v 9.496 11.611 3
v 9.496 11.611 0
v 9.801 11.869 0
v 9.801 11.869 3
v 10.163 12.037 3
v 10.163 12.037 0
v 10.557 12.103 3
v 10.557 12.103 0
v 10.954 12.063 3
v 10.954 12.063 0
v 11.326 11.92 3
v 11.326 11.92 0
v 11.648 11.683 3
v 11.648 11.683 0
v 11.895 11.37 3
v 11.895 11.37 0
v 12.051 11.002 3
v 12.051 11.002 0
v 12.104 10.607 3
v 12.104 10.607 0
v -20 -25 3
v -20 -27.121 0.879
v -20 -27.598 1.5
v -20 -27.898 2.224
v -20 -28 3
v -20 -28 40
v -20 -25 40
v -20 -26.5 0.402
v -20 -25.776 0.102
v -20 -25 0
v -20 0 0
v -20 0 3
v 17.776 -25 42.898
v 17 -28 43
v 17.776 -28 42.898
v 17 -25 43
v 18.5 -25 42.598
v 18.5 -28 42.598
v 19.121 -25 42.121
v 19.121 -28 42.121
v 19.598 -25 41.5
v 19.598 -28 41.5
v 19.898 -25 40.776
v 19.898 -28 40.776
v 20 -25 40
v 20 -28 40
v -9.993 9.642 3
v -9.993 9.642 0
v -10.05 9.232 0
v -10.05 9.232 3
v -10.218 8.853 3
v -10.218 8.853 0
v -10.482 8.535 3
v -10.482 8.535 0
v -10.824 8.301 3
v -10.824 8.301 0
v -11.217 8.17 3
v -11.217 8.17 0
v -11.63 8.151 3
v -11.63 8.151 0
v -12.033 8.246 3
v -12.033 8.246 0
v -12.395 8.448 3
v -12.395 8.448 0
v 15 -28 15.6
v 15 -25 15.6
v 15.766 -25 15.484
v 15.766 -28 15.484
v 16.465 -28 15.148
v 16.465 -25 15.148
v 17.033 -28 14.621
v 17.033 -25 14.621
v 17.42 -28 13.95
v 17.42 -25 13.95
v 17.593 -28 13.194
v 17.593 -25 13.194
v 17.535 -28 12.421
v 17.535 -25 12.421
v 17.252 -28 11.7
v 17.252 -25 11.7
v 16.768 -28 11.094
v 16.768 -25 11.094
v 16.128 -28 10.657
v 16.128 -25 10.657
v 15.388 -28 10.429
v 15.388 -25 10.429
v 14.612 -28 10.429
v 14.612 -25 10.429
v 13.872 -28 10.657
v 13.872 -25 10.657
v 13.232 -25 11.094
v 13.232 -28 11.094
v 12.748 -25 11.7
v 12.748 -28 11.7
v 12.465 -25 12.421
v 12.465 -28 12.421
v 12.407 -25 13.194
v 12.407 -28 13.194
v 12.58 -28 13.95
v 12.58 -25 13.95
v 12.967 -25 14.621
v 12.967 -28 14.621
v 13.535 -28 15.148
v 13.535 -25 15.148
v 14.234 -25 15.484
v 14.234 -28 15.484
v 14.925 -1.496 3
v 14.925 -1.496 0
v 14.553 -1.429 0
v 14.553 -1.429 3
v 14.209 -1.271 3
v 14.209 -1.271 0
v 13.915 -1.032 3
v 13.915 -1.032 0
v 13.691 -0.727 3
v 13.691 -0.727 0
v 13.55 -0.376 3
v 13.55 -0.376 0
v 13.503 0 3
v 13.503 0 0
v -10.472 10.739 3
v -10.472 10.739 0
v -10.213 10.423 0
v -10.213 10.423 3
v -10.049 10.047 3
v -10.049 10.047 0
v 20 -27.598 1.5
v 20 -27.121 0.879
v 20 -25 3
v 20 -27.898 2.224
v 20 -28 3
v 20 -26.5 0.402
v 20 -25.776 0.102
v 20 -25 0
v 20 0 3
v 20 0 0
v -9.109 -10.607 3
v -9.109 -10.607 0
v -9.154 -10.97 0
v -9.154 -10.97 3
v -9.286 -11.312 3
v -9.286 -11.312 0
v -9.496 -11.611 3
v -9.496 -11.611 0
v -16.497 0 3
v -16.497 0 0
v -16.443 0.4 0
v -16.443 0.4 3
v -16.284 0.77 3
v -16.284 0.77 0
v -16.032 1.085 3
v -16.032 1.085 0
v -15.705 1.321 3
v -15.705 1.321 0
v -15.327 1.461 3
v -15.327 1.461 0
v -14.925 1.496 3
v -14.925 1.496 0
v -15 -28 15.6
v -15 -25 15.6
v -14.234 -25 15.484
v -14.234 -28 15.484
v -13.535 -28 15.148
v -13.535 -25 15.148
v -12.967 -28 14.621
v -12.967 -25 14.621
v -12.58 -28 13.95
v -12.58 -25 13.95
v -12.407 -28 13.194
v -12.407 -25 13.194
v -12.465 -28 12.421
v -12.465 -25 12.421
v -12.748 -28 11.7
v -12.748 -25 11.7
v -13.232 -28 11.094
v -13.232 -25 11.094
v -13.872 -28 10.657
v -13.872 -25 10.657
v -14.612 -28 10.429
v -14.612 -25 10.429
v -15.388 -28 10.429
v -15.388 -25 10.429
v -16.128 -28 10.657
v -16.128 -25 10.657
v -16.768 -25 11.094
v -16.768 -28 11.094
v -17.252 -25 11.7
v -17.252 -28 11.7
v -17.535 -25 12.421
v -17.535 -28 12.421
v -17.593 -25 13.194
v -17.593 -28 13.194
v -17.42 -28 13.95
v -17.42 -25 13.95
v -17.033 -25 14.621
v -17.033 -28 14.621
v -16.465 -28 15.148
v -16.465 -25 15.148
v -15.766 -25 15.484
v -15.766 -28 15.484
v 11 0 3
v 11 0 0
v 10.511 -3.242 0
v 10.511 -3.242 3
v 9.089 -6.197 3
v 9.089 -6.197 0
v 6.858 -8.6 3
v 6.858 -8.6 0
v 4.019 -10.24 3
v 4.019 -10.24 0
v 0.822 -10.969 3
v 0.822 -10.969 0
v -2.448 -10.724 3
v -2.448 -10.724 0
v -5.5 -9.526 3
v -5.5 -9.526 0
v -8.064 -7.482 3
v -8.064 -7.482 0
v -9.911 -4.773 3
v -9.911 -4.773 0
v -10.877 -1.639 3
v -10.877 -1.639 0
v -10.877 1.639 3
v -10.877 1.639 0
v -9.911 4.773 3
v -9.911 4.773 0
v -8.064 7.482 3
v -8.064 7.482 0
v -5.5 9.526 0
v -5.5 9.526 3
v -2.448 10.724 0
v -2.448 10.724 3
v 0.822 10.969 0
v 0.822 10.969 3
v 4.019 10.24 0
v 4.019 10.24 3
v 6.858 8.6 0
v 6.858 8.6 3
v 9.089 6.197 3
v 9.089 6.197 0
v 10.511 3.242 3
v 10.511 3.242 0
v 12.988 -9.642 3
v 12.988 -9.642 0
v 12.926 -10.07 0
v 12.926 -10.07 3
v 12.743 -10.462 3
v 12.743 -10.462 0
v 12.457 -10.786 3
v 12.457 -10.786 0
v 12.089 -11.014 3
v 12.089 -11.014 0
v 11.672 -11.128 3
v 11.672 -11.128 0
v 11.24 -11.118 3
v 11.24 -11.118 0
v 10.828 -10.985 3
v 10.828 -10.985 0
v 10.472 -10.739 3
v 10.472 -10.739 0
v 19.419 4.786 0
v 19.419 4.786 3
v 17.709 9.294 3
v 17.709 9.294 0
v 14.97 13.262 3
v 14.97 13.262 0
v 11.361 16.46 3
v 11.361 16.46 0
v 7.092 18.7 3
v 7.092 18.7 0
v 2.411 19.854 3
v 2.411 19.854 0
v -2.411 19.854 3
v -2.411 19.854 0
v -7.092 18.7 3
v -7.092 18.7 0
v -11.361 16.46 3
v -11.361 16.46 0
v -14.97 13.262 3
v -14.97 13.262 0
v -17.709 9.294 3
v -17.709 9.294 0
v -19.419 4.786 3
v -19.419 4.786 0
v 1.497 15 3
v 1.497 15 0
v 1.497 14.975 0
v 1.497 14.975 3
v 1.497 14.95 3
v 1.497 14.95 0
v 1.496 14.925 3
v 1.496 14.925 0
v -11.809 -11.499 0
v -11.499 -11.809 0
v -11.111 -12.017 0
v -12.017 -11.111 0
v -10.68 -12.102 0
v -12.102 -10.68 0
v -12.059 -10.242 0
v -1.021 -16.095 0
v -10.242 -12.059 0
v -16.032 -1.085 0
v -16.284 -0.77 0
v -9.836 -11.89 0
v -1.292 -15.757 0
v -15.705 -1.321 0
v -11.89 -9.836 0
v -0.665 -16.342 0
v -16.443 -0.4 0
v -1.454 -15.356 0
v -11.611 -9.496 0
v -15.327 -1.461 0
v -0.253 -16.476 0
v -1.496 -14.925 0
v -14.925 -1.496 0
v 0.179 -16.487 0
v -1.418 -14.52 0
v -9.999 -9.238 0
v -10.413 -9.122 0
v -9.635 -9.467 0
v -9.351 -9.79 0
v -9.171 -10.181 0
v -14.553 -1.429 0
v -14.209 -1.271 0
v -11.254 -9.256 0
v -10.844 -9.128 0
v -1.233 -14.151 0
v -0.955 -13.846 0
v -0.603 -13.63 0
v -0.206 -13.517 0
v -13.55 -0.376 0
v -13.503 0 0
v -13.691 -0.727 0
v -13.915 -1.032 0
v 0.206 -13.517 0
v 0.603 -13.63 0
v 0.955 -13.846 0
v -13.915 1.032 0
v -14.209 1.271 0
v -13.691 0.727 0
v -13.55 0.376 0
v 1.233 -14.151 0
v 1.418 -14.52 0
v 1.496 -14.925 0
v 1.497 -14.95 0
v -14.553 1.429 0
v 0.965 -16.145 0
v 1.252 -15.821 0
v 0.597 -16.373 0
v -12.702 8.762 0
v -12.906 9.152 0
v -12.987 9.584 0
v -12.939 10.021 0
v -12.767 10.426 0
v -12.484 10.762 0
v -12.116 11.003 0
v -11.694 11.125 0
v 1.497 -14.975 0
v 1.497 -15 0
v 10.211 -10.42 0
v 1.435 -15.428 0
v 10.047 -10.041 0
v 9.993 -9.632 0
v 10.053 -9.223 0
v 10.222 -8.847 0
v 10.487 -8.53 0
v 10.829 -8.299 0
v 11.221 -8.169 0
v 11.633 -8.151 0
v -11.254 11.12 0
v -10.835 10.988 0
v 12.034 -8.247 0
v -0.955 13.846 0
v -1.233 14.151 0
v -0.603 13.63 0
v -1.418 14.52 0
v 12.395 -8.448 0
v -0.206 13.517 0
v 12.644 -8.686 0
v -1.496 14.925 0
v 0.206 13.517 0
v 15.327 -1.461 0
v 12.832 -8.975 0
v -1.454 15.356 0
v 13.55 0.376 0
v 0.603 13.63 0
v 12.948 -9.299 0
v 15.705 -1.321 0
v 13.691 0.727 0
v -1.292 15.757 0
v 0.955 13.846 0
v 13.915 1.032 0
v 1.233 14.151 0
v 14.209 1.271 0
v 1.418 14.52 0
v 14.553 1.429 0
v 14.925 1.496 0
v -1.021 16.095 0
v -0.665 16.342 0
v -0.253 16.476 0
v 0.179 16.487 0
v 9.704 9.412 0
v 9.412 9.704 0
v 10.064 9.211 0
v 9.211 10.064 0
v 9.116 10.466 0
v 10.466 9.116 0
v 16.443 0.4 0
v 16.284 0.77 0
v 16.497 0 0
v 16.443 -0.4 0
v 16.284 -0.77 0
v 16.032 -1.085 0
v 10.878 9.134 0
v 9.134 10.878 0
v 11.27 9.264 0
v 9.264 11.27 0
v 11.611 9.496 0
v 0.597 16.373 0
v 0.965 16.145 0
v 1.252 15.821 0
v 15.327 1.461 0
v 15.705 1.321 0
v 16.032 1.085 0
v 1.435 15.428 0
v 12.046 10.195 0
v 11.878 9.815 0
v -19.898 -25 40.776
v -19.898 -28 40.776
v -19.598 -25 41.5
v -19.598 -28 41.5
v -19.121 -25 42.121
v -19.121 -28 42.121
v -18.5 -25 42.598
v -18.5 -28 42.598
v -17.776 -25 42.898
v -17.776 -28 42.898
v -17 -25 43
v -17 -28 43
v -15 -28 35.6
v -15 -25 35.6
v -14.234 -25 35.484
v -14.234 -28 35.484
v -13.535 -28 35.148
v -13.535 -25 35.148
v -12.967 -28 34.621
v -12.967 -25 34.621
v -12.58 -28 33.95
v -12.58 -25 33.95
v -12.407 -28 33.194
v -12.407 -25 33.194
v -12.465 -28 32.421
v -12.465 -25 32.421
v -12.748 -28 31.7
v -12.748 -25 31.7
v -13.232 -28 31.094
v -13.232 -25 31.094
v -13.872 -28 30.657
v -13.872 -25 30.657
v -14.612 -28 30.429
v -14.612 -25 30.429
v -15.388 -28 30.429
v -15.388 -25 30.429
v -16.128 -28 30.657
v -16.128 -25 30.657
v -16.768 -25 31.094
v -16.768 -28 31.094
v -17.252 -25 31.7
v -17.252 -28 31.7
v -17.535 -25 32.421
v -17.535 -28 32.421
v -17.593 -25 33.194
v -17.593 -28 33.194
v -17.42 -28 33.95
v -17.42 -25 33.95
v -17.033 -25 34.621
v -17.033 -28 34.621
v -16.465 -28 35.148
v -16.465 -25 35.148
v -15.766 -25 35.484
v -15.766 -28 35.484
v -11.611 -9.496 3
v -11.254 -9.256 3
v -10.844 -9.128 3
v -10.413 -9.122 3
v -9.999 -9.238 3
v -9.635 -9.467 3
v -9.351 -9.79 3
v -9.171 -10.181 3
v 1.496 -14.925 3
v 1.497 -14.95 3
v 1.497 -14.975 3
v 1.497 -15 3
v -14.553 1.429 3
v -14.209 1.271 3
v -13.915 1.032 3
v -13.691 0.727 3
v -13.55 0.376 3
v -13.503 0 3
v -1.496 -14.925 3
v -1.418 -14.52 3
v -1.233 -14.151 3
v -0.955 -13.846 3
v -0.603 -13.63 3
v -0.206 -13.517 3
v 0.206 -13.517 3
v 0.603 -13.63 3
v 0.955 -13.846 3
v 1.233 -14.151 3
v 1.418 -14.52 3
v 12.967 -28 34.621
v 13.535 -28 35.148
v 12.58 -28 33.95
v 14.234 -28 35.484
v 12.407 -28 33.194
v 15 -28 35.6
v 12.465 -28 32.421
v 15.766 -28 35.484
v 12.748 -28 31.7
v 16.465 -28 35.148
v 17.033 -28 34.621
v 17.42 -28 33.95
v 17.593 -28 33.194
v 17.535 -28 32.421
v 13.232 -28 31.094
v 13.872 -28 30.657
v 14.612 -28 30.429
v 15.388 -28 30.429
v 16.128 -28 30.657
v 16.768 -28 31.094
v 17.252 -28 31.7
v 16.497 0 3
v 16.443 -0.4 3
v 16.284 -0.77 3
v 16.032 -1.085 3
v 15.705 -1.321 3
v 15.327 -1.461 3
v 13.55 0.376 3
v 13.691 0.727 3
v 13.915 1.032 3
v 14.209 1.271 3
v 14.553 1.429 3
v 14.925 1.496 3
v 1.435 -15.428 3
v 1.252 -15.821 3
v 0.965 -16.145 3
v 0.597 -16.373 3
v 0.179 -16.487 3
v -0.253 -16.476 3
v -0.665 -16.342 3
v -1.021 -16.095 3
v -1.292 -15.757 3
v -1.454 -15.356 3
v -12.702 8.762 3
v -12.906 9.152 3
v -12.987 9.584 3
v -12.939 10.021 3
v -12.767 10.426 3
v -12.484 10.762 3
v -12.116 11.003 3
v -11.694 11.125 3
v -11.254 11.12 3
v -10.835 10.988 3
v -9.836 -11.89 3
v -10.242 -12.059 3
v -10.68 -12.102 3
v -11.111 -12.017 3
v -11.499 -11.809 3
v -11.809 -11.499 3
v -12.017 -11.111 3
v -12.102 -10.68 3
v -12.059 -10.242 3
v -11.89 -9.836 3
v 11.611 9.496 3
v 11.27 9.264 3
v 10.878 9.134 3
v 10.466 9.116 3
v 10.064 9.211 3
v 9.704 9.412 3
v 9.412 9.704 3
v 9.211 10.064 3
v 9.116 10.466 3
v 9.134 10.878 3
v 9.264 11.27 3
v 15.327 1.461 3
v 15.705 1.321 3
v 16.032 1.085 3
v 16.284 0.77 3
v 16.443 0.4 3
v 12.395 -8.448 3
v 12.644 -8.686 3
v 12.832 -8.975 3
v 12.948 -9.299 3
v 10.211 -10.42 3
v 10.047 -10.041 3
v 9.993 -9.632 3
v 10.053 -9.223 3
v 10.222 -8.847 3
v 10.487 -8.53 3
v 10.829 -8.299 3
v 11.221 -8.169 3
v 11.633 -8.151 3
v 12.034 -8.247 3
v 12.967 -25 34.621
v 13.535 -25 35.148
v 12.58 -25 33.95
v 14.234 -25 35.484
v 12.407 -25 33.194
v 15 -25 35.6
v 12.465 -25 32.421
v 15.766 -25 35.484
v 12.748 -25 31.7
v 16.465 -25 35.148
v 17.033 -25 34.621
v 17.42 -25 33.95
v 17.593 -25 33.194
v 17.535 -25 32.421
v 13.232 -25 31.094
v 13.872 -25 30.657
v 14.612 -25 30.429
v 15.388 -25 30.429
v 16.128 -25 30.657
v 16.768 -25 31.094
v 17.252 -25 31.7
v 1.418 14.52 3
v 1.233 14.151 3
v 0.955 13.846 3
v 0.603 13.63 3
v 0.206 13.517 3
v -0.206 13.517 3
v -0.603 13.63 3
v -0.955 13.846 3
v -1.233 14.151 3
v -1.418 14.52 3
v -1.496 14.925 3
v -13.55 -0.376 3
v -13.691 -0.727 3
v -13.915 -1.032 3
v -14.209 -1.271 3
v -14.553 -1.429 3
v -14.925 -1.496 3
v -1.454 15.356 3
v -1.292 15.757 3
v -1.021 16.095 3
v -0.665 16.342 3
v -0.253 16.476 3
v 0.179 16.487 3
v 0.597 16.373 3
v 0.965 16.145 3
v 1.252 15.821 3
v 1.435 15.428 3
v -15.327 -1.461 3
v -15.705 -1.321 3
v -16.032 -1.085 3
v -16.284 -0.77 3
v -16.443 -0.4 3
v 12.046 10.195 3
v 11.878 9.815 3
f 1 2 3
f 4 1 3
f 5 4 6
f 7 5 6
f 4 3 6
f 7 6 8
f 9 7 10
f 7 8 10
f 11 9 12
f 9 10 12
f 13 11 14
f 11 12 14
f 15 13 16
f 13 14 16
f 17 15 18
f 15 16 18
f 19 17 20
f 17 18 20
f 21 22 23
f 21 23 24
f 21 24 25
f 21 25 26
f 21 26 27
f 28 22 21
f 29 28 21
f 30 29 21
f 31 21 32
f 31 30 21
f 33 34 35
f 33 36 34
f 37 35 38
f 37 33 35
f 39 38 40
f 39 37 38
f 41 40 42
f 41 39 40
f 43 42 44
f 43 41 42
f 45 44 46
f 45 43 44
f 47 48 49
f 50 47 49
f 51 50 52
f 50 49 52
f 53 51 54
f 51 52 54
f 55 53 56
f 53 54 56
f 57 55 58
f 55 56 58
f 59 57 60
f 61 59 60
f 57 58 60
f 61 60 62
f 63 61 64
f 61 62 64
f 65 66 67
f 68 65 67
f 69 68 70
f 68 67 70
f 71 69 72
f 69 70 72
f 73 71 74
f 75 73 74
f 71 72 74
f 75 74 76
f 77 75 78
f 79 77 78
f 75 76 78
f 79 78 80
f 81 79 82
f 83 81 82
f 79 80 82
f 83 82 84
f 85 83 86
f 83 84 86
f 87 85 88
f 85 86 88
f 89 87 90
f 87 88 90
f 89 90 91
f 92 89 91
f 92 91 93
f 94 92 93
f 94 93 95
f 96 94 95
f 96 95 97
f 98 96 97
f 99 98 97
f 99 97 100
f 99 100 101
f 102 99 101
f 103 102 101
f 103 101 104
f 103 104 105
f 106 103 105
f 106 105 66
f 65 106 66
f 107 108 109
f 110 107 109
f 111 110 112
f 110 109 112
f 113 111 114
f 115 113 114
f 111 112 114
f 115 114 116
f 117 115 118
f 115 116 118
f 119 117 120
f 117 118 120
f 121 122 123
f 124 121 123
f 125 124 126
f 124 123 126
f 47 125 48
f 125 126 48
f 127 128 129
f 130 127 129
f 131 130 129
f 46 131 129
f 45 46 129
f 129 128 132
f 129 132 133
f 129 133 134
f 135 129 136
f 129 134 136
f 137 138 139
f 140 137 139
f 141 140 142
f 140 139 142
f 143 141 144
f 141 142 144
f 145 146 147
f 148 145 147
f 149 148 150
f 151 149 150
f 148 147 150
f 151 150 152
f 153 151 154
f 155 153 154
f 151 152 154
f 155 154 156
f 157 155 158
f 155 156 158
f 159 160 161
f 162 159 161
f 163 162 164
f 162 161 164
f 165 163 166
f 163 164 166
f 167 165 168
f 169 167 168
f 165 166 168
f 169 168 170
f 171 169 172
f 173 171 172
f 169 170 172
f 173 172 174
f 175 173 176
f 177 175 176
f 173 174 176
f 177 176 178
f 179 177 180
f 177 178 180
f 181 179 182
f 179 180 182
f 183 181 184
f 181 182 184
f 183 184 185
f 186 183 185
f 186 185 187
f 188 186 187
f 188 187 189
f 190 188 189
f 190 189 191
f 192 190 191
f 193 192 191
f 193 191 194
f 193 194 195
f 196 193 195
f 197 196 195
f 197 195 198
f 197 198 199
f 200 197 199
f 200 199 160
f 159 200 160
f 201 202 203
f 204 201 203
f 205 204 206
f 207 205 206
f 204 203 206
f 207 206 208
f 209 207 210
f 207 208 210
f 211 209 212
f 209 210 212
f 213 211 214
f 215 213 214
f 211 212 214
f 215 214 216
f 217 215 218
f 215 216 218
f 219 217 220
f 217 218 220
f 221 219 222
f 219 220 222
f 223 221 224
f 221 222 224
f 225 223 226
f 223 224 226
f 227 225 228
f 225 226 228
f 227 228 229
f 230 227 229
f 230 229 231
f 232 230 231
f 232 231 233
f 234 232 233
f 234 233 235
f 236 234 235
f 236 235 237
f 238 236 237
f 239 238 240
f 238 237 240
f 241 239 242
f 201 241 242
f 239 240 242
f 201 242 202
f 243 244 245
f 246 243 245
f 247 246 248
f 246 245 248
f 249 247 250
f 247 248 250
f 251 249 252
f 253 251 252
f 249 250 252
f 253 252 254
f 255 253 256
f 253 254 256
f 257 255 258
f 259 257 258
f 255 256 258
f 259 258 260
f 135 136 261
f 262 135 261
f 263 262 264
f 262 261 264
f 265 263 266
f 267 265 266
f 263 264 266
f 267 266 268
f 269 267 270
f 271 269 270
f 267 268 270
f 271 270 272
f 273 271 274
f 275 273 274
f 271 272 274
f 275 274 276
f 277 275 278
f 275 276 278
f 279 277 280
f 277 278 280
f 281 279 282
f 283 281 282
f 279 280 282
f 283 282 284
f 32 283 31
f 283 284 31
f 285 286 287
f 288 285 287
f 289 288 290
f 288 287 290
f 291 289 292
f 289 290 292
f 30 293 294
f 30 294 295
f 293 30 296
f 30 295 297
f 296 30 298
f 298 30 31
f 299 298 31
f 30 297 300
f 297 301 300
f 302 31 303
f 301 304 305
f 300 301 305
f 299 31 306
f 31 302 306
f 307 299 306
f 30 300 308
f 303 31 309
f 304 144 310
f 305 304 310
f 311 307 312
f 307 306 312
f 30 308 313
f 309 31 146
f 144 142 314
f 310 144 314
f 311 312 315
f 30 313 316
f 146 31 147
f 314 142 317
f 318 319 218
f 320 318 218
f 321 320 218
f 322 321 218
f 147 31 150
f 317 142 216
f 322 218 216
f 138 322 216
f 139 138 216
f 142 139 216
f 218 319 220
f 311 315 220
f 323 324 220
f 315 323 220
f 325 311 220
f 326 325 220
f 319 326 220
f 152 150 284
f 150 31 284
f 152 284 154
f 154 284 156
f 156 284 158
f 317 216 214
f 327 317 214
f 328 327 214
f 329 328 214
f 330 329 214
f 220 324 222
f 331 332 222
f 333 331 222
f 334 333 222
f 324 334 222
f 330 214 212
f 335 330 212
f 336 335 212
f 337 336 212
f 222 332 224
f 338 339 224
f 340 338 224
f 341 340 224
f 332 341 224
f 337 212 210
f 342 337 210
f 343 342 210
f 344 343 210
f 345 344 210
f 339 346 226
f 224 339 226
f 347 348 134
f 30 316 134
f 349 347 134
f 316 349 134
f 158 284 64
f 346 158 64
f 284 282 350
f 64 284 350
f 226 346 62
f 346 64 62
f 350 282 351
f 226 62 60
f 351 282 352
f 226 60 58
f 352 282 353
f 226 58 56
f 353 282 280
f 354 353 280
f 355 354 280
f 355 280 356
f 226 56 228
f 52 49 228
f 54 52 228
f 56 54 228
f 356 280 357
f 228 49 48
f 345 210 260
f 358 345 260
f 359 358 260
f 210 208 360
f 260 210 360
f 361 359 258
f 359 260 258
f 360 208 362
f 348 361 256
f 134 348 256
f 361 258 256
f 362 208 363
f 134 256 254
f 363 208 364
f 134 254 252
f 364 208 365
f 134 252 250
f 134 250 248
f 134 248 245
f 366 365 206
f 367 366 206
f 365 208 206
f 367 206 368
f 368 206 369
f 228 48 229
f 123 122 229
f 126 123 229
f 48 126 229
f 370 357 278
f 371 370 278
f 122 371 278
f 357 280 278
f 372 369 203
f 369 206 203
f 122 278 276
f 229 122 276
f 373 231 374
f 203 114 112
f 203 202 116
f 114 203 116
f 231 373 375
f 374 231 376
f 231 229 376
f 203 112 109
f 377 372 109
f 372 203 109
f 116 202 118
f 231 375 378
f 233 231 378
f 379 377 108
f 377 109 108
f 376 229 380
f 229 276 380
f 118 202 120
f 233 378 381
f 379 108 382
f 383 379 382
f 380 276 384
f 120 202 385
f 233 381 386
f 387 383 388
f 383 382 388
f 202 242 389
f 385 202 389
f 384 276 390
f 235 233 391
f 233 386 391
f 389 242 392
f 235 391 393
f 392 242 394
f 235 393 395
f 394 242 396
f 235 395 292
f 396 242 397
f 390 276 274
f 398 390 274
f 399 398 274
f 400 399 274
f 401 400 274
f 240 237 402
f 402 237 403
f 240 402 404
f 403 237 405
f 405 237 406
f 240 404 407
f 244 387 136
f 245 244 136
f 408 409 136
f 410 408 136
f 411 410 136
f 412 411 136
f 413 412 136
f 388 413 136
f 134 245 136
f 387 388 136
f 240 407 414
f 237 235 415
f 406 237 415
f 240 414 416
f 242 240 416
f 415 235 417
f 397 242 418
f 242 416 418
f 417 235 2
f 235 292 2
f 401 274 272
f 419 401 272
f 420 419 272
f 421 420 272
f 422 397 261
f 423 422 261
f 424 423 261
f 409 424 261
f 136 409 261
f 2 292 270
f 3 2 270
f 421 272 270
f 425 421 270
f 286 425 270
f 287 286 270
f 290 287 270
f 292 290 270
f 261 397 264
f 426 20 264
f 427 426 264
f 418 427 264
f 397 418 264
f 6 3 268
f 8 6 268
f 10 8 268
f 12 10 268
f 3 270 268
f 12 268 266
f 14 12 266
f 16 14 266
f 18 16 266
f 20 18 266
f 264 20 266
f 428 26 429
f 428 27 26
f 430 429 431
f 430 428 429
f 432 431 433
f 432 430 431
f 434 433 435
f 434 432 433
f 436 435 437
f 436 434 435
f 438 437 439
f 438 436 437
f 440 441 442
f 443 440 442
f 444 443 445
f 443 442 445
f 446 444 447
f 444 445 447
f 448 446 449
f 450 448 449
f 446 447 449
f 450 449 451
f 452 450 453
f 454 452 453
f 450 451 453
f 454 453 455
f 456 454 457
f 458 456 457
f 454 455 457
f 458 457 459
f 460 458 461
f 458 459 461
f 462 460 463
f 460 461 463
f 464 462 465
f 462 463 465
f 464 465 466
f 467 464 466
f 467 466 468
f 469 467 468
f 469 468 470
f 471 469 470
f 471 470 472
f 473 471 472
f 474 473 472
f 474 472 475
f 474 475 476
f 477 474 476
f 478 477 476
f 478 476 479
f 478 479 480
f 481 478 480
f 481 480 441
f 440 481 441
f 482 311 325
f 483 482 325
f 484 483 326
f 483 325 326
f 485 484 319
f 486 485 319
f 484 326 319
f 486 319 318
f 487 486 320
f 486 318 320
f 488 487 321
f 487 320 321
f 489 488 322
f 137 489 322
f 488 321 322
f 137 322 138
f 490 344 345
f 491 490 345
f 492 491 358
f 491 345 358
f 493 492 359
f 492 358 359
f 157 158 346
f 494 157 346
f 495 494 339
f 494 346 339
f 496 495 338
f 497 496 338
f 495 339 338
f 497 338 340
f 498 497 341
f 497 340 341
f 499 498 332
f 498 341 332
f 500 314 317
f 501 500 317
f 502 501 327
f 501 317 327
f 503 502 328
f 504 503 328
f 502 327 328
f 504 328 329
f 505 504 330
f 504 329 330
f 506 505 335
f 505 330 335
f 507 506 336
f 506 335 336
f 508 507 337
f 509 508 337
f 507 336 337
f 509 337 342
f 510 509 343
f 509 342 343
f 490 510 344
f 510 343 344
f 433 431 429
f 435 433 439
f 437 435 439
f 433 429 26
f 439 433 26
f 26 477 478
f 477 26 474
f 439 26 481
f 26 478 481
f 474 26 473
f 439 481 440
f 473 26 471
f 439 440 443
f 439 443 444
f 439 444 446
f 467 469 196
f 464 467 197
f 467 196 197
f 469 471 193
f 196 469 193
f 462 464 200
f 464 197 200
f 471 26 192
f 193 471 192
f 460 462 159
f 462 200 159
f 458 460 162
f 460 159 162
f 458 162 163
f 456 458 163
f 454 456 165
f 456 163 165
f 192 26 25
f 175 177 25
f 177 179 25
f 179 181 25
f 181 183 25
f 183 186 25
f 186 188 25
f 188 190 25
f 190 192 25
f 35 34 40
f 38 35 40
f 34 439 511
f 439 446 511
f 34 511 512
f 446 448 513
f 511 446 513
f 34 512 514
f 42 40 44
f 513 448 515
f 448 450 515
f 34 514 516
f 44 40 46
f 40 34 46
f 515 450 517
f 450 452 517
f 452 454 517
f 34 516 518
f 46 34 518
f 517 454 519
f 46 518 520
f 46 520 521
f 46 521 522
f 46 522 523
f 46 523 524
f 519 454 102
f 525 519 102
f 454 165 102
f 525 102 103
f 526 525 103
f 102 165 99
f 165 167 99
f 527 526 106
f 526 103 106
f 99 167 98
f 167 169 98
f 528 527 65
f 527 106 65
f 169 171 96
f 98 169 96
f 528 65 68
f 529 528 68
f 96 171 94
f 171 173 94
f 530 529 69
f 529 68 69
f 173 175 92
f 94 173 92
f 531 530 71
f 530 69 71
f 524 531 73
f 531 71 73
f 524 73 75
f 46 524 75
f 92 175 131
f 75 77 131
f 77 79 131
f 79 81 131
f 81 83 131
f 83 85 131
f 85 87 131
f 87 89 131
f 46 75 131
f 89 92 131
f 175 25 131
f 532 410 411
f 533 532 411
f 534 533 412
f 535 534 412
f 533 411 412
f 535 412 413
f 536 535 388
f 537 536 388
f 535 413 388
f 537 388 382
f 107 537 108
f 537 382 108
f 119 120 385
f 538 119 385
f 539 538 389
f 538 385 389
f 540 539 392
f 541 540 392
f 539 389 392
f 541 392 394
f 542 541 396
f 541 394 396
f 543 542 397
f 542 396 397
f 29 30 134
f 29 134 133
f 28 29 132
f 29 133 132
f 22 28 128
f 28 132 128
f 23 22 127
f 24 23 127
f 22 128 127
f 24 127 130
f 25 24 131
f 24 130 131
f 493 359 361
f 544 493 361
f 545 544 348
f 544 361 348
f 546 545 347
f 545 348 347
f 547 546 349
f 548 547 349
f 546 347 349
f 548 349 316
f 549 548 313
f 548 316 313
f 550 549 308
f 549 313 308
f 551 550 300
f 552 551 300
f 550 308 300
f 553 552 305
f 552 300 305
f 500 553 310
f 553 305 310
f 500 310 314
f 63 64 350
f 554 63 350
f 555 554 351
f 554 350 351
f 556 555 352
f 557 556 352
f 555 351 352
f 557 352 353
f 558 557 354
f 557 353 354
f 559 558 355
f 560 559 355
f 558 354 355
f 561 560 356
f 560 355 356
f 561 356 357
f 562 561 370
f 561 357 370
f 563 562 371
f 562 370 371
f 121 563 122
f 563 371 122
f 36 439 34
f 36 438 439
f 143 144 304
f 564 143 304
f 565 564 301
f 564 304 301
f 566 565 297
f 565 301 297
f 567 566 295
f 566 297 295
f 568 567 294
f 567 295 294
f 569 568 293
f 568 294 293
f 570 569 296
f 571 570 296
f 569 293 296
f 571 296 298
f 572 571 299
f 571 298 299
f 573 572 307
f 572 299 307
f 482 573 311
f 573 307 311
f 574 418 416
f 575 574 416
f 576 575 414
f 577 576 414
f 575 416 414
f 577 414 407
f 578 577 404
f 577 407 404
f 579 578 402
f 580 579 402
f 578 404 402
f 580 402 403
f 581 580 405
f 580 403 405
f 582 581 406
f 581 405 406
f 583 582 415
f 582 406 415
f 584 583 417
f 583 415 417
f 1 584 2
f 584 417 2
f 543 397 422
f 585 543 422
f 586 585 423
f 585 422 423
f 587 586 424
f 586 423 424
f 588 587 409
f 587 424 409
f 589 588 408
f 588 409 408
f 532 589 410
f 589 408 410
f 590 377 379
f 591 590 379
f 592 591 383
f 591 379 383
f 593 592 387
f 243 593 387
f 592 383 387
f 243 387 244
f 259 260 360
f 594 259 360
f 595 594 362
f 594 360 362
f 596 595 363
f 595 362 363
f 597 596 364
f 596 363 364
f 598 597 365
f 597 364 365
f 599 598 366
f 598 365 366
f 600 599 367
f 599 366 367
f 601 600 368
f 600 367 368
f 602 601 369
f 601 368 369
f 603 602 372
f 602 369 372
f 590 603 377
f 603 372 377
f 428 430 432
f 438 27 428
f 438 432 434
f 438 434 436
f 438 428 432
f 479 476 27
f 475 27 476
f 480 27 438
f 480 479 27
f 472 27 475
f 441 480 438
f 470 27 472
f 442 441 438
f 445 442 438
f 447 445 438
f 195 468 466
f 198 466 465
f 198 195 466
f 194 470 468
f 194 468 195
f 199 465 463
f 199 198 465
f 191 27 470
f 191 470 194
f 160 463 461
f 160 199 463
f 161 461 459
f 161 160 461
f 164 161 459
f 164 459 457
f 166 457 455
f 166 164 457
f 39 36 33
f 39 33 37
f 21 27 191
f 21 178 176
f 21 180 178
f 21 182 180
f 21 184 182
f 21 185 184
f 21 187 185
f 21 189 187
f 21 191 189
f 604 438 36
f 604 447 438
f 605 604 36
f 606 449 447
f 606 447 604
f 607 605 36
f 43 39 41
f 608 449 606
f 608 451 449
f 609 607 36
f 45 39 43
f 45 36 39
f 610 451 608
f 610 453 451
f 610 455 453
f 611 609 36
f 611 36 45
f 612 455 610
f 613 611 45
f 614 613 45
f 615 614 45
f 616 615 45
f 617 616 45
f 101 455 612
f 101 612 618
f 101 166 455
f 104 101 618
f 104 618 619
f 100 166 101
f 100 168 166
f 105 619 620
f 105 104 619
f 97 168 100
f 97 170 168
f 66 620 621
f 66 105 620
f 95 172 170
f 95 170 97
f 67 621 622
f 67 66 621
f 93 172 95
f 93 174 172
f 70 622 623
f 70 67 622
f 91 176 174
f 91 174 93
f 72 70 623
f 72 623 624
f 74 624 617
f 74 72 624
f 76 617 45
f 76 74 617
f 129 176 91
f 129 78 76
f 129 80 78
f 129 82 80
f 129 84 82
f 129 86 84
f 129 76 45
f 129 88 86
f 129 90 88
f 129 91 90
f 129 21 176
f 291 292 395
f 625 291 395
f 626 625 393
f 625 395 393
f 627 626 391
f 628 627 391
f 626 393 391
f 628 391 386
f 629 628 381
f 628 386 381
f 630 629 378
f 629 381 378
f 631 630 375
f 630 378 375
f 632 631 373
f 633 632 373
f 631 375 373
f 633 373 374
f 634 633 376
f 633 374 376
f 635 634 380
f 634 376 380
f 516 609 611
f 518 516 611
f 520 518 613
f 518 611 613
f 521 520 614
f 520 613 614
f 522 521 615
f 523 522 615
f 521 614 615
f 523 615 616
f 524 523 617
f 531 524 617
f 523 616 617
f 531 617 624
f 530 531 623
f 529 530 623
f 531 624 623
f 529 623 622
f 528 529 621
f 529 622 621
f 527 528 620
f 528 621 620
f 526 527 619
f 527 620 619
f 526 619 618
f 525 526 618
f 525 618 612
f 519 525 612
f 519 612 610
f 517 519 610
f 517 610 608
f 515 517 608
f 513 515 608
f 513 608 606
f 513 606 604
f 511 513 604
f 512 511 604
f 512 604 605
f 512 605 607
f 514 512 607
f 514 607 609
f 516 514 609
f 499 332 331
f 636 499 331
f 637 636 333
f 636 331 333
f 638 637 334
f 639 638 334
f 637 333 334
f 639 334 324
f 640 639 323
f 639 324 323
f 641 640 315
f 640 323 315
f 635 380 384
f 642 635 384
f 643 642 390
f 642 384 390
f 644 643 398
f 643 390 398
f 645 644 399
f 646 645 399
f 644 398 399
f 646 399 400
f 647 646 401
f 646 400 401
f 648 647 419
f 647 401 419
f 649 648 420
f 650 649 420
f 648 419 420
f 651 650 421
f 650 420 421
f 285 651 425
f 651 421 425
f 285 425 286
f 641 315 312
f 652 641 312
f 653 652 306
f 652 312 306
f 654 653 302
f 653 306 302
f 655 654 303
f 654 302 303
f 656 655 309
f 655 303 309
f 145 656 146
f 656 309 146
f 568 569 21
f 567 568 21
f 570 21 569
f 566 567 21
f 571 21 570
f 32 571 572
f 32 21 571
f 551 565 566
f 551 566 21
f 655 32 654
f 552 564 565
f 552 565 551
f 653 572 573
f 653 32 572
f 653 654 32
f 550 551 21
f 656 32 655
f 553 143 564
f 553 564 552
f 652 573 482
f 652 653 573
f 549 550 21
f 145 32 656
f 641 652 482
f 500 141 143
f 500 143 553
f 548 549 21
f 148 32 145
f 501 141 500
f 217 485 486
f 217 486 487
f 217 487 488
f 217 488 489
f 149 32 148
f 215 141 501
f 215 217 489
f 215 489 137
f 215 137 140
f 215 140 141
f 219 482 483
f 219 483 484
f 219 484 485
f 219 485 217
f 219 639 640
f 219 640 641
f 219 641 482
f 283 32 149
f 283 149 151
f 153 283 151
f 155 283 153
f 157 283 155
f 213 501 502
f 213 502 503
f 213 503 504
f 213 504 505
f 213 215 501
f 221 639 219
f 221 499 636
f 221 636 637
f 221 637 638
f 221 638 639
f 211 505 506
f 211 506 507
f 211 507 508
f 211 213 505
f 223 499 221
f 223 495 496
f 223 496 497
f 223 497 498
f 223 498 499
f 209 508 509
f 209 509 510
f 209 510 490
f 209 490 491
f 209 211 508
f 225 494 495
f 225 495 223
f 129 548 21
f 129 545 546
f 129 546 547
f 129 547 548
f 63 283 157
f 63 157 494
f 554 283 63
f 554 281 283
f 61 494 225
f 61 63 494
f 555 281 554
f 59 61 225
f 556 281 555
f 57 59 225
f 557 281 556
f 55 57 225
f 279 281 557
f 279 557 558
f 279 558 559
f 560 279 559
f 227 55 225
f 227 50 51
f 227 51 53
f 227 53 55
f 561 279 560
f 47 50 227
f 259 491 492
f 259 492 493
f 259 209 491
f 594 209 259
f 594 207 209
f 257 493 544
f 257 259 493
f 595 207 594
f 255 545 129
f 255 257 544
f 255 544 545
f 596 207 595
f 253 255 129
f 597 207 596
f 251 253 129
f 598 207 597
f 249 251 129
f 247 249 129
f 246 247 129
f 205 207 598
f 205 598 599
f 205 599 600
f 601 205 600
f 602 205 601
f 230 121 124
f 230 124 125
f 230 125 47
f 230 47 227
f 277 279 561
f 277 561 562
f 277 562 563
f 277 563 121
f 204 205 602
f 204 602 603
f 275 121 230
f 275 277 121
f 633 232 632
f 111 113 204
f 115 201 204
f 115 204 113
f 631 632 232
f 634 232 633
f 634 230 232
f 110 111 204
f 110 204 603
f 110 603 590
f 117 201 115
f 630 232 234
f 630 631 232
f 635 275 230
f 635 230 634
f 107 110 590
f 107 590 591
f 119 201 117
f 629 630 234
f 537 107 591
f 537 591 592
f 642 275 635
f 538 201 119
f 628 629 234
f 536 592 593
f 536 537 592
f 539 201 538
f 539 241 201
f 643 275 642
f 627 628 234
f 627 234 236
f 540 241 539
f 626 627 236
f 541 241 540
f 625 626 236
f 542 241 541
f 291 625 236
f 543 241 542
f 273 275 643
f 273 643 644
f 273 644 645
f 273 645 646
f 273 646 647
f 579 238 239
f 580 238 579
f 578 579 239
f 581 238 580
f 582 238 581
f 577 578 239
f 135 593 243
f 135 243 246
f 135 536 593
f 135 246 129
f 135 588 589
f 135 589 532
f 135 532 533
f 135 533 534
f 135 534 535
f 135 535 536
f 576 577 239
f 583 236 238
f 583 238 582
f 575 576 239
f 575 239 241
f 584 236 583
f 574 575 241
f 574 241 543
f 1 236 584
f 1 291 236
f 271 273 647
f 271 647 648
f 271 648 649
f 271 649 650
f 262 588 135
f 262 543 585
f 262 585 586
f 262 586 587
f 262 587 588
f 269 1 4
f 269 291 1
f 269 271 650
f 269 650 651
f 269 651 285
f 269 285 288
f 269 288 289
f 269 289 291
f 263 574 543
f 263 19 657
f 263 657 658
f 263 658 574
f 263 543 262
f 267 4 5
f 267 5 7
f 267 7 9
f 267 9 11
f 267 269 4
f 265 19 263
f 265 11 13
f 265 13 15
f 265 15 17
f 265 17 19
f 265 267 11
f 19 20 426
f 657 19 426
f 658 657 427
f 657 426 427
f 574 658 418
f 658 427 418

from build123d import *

# Parameters (mm, degrees)
EXTRUDE_1_DEPTH     = 3
SKETCH_2_W          = 40
SKETCH_2_H          = 3
EXTRUDE_2_DEPTH     = 40
SKETCH_3_R          = 2.6
CUT_EXTRUDE_1_DEPTH = 40
FILLET_1_R          = 3


with BuildPart() as part:
    # 草图1 → 凸台-拉伸1 (new body)
    with BuildSketch(Plane.XY):
        with BuildLine():
            Line((11, 0), (13.502586321, 0))
            ThreePointArc((13.502586321, 0), (13.915065254, 1.032067984), (14.925258409, 1.495547198))
            ThreePointArc((14.925258409, 1.495547198), (13.858192988, 5.740251485), (11.611262997, 9.496239867))
            ThreePointArc((11.611262997, 9.496239867), (9.547770351, 9.547770351), (9.496239867, 11.611262997))
            ThreePointArc((9.496239867, 11.611262997), (5.740251485, 13.858192988), (1.495547198, 14.925258409))
            ThreePointArc((1.495547198, 14.925258409), (0, 13.502586321), (-1.495547198, 14.925258409))
            ThreePointArc((-1.495547198, 14.925258409), (-6.339273926, 13.594616806), (-10.472092058, 10.739426797))
            ThreePointArc((-10.472092058, 10.739426797), (-10.118173432, 10.240571276), (-9.993252967, 9.641814145))
            ThreePointArc((-9.993252967, 9.641814145), (-10.824149511, 8.300917939), (-12.394730475, 8.448115556))
            ThreePointArc((-12.394730475, 8.448115556), (-14.095389312, 5.13030215), (-14.925258409, 1.495547198))
            ThreePointArc((-14.925258409, 1.495547198), (-13.915065254, 1.032067984), (-13.502586321, 0))
            Line((-13.502586321, 0), (-11, 0))
            ThreePointArc((-11, 0), (0, 11), (11, 0))
        make_face()
        with BuildLine():
            ThreePointArc((14.925258409, -1.495547198), (13.915065254, -1.032067984), (13.502586321, 0))
            Line((13.502586321, 0), (11, 0))
            ThreePointArc((11, 0), (0, -11), (-11, 0))
            Line((-11, 0), (-13.502586321, 0))
            ThreePointArc((-13.502586321, 0), (-13.915065254, -1.032067984), (-14.925258409, -1.495547198))
            ThreePointArc((-14.925258409, -1.495547198), (-13.858192988, -5.740251485), (-11.611262997, -9.496239867))
            ThreePointArc((-11.611262997, -9.496239867), (-9.99920803, -9.237908679), (-9.109188038, -10.606601718))
            ThreePointArc((-9.109188038, -10.606601718), (-9.209297393, -11.144921652), (-9.496239867, -11.611262997))
            ThreePointArc((-9.496239867, -11.611262997), (-5.740251485, -13.858192988), (-1.495547198, -14.925258409))
            ThreePointArc((-1.495547198, -14.925258409), (0, -13.502586321), (1.495547198, -14.925258409))
            ThreePointArc((1.495547198, -14.925258409), (6.339273926, -13.594616806), (10.472092058, -10.739426797))
            ThreePointArc((10.472092058, -10.739426797), (10.343581219, -8.679295186), (12.394730475, -8.448115556))
            ThreePointArc((12.394730475, -8.448115556), (14.095389312, -5.13030215), (14.925258409, -1.495547198))
        make_face()
        with BuildLine():
            ThreePointArc((14.925258409, 1.495547198), (16.032067984, 1.084934746), (16.497413679, 0))
            Line((16.497413679, 0), (20, 0))
            ThreePointArc((20, 0), (0, 20), (-20, 0))
            Line((-20, 0), (-16.497413679, 0))
            ThreePointArc((-16.497413679, 0), (-16.032067984, 1.084934746), (-14.925258409, 1.495547198))
            ThreePointArc((-14.925258409, 1.495547198), (-14.095389312, 5.13030215), (-12.394730475, 8.448115556))
            ThreePointArc((-12.394730475, 8.448115556), (-12.637752075, 10.604333105), (-10.472092058, 10.739426797))
            ThreePointArc((-10.472092058, 10.739426797), (-6.339273926, 13.594616806), (-1.495547198, 14.925258409))
            ThreePointArc((-1.495547198, 14.925258409), (-0.037382446, 16.496946986), (1.497413679, 15))
            ThreePointArc((1.497413679, 15), (1.496946986, 14.962617554), (1.495547198, 14.925258409))
            ThreePointArc((1.495547198, 14.925258409), (5.740251485, 13.858192988), (9.496239867, 11.611262997))
            ThreePointArc((9.496239867, 11.611262997), (11.144921652, 12.003906043), (12.104015397, 10.606601718))
            ThreePointArc((12.104015397, 10.606601718), (11.975294757, 9.99920803), (11.611262997, 9.496239867))
            ThreePointArc((11.611262997, 9.496239867), (13.858192988, 5.740251485), (14.925258409, 1.495547198))
        make_face()
        with BuildLine():
            Line((20, 0), (16.497413679, 0))
            ThreePointArc((16.497413679, 0), (16.032067984, -1.084934746), (14.925258409, -1.495547198))
            ThreePointArc((14.925258409, -1.495547198), (14.095389312, -5.13030215), (12.394730475, -8.448115556))
            ThreePointArc((12.394730475, -8.448115556), (12.831562853, -8.97529701), (12.988080326, -9.641814145))
            ThreePointArc((12.988080326, -9.641814145), (12.089423778, -11.01430736), (10.472092058, -10.739426797))
            ThreePointArc((10.472092058, -10.739426797), (6.339273926, -13.594616806), (1.495547198, -14.925258409))
            ThreePointArc((1.495547198, -14.925258409), (1.496946986, -14.962617554), (1.497413679, -15))
            ThreePointArc((1.497413679, -15), (-0.037382446, -16.496946986), (-1.495547198, -14.925258409))
            ThreePointArc((-1.495547198, -14.925258409), (-5.740251485, -13.858192988), (-9.496239867, -11.611262997))
            ThreePointArc((-9.496239867, -11.611262997), (-11.665433085, -11.665433085), (-11.611262997, -9.496239867))
            ThreePointArc((-11.611262997, -9.496239867), (-13.858192988, -5.740251485), (-14.925258409, -1.495547198))
            ThreePointArc((-14.925258409, -1.495547198), (-16.032067984, -1.084934746), (-16.497413679, 0))
            Line((-16.497413679, 0), (-20, 0))
            ThreePointArc((-20, 0), (0, -20), (20, 0))
        make_face()
        with BuildLine():
            Line((20, -28), (20, 0))
            ThreePointArc((20, 0), (0, -20), (-20, 0))
            Line((-20, 0), (-20, -28))
            Line((-20, -28), (20, -28))
        make_face()
    extrude(amount=EXTRUDE_1_DEPTH)

    # 草图2 → 凸台-拉伸2 (add)
    with BuildSketch(Plane.XY.offset(3)):
        with Locations((0, -26.5)):
            Rectangle(SKETCH_2_W, SKETCH_2_H)
    extrude(amount=EXTRUDE_2_DEPTH)

    # 草图3 → 切除-拉伸1 (cut)
    with BuildSketch(Plane(origin=(0, -25, 0), x_dir=(1, 0, 0), z_dir=(0, 1, 0))):
        with Locations(Location((-15, -13, 0), (0, 0, 270))):
            Circle(SKETCH_3_R)
        with Locations(Location((-15, -33, 0), (0, 0, 270))):
            Circle(SKETCH_3_R)
        with Locations(Location((15, -33, 0), (0, 0, 270))):
            Circle(SKETCH_3_R)
        with Locations(Location((15, -13, 0), (0, 0, 270))):
            Circle(SKETCH_3_R)
    extrude(amount=-CUT_EXTRUDE_1_DEPTH, mode=Mode.SUBTRACT)

    # 圆角1
    fillet_1_edges = [part.edges().sort_by_distance(p)[0] for p in [
        (0, -28, 0),
        (-20, -26.5, 43),
        (20, -26.5, 43),
    ]]
    fillet(fillet_1_edges, radius=FILLET_1_R)


solid = part.part
